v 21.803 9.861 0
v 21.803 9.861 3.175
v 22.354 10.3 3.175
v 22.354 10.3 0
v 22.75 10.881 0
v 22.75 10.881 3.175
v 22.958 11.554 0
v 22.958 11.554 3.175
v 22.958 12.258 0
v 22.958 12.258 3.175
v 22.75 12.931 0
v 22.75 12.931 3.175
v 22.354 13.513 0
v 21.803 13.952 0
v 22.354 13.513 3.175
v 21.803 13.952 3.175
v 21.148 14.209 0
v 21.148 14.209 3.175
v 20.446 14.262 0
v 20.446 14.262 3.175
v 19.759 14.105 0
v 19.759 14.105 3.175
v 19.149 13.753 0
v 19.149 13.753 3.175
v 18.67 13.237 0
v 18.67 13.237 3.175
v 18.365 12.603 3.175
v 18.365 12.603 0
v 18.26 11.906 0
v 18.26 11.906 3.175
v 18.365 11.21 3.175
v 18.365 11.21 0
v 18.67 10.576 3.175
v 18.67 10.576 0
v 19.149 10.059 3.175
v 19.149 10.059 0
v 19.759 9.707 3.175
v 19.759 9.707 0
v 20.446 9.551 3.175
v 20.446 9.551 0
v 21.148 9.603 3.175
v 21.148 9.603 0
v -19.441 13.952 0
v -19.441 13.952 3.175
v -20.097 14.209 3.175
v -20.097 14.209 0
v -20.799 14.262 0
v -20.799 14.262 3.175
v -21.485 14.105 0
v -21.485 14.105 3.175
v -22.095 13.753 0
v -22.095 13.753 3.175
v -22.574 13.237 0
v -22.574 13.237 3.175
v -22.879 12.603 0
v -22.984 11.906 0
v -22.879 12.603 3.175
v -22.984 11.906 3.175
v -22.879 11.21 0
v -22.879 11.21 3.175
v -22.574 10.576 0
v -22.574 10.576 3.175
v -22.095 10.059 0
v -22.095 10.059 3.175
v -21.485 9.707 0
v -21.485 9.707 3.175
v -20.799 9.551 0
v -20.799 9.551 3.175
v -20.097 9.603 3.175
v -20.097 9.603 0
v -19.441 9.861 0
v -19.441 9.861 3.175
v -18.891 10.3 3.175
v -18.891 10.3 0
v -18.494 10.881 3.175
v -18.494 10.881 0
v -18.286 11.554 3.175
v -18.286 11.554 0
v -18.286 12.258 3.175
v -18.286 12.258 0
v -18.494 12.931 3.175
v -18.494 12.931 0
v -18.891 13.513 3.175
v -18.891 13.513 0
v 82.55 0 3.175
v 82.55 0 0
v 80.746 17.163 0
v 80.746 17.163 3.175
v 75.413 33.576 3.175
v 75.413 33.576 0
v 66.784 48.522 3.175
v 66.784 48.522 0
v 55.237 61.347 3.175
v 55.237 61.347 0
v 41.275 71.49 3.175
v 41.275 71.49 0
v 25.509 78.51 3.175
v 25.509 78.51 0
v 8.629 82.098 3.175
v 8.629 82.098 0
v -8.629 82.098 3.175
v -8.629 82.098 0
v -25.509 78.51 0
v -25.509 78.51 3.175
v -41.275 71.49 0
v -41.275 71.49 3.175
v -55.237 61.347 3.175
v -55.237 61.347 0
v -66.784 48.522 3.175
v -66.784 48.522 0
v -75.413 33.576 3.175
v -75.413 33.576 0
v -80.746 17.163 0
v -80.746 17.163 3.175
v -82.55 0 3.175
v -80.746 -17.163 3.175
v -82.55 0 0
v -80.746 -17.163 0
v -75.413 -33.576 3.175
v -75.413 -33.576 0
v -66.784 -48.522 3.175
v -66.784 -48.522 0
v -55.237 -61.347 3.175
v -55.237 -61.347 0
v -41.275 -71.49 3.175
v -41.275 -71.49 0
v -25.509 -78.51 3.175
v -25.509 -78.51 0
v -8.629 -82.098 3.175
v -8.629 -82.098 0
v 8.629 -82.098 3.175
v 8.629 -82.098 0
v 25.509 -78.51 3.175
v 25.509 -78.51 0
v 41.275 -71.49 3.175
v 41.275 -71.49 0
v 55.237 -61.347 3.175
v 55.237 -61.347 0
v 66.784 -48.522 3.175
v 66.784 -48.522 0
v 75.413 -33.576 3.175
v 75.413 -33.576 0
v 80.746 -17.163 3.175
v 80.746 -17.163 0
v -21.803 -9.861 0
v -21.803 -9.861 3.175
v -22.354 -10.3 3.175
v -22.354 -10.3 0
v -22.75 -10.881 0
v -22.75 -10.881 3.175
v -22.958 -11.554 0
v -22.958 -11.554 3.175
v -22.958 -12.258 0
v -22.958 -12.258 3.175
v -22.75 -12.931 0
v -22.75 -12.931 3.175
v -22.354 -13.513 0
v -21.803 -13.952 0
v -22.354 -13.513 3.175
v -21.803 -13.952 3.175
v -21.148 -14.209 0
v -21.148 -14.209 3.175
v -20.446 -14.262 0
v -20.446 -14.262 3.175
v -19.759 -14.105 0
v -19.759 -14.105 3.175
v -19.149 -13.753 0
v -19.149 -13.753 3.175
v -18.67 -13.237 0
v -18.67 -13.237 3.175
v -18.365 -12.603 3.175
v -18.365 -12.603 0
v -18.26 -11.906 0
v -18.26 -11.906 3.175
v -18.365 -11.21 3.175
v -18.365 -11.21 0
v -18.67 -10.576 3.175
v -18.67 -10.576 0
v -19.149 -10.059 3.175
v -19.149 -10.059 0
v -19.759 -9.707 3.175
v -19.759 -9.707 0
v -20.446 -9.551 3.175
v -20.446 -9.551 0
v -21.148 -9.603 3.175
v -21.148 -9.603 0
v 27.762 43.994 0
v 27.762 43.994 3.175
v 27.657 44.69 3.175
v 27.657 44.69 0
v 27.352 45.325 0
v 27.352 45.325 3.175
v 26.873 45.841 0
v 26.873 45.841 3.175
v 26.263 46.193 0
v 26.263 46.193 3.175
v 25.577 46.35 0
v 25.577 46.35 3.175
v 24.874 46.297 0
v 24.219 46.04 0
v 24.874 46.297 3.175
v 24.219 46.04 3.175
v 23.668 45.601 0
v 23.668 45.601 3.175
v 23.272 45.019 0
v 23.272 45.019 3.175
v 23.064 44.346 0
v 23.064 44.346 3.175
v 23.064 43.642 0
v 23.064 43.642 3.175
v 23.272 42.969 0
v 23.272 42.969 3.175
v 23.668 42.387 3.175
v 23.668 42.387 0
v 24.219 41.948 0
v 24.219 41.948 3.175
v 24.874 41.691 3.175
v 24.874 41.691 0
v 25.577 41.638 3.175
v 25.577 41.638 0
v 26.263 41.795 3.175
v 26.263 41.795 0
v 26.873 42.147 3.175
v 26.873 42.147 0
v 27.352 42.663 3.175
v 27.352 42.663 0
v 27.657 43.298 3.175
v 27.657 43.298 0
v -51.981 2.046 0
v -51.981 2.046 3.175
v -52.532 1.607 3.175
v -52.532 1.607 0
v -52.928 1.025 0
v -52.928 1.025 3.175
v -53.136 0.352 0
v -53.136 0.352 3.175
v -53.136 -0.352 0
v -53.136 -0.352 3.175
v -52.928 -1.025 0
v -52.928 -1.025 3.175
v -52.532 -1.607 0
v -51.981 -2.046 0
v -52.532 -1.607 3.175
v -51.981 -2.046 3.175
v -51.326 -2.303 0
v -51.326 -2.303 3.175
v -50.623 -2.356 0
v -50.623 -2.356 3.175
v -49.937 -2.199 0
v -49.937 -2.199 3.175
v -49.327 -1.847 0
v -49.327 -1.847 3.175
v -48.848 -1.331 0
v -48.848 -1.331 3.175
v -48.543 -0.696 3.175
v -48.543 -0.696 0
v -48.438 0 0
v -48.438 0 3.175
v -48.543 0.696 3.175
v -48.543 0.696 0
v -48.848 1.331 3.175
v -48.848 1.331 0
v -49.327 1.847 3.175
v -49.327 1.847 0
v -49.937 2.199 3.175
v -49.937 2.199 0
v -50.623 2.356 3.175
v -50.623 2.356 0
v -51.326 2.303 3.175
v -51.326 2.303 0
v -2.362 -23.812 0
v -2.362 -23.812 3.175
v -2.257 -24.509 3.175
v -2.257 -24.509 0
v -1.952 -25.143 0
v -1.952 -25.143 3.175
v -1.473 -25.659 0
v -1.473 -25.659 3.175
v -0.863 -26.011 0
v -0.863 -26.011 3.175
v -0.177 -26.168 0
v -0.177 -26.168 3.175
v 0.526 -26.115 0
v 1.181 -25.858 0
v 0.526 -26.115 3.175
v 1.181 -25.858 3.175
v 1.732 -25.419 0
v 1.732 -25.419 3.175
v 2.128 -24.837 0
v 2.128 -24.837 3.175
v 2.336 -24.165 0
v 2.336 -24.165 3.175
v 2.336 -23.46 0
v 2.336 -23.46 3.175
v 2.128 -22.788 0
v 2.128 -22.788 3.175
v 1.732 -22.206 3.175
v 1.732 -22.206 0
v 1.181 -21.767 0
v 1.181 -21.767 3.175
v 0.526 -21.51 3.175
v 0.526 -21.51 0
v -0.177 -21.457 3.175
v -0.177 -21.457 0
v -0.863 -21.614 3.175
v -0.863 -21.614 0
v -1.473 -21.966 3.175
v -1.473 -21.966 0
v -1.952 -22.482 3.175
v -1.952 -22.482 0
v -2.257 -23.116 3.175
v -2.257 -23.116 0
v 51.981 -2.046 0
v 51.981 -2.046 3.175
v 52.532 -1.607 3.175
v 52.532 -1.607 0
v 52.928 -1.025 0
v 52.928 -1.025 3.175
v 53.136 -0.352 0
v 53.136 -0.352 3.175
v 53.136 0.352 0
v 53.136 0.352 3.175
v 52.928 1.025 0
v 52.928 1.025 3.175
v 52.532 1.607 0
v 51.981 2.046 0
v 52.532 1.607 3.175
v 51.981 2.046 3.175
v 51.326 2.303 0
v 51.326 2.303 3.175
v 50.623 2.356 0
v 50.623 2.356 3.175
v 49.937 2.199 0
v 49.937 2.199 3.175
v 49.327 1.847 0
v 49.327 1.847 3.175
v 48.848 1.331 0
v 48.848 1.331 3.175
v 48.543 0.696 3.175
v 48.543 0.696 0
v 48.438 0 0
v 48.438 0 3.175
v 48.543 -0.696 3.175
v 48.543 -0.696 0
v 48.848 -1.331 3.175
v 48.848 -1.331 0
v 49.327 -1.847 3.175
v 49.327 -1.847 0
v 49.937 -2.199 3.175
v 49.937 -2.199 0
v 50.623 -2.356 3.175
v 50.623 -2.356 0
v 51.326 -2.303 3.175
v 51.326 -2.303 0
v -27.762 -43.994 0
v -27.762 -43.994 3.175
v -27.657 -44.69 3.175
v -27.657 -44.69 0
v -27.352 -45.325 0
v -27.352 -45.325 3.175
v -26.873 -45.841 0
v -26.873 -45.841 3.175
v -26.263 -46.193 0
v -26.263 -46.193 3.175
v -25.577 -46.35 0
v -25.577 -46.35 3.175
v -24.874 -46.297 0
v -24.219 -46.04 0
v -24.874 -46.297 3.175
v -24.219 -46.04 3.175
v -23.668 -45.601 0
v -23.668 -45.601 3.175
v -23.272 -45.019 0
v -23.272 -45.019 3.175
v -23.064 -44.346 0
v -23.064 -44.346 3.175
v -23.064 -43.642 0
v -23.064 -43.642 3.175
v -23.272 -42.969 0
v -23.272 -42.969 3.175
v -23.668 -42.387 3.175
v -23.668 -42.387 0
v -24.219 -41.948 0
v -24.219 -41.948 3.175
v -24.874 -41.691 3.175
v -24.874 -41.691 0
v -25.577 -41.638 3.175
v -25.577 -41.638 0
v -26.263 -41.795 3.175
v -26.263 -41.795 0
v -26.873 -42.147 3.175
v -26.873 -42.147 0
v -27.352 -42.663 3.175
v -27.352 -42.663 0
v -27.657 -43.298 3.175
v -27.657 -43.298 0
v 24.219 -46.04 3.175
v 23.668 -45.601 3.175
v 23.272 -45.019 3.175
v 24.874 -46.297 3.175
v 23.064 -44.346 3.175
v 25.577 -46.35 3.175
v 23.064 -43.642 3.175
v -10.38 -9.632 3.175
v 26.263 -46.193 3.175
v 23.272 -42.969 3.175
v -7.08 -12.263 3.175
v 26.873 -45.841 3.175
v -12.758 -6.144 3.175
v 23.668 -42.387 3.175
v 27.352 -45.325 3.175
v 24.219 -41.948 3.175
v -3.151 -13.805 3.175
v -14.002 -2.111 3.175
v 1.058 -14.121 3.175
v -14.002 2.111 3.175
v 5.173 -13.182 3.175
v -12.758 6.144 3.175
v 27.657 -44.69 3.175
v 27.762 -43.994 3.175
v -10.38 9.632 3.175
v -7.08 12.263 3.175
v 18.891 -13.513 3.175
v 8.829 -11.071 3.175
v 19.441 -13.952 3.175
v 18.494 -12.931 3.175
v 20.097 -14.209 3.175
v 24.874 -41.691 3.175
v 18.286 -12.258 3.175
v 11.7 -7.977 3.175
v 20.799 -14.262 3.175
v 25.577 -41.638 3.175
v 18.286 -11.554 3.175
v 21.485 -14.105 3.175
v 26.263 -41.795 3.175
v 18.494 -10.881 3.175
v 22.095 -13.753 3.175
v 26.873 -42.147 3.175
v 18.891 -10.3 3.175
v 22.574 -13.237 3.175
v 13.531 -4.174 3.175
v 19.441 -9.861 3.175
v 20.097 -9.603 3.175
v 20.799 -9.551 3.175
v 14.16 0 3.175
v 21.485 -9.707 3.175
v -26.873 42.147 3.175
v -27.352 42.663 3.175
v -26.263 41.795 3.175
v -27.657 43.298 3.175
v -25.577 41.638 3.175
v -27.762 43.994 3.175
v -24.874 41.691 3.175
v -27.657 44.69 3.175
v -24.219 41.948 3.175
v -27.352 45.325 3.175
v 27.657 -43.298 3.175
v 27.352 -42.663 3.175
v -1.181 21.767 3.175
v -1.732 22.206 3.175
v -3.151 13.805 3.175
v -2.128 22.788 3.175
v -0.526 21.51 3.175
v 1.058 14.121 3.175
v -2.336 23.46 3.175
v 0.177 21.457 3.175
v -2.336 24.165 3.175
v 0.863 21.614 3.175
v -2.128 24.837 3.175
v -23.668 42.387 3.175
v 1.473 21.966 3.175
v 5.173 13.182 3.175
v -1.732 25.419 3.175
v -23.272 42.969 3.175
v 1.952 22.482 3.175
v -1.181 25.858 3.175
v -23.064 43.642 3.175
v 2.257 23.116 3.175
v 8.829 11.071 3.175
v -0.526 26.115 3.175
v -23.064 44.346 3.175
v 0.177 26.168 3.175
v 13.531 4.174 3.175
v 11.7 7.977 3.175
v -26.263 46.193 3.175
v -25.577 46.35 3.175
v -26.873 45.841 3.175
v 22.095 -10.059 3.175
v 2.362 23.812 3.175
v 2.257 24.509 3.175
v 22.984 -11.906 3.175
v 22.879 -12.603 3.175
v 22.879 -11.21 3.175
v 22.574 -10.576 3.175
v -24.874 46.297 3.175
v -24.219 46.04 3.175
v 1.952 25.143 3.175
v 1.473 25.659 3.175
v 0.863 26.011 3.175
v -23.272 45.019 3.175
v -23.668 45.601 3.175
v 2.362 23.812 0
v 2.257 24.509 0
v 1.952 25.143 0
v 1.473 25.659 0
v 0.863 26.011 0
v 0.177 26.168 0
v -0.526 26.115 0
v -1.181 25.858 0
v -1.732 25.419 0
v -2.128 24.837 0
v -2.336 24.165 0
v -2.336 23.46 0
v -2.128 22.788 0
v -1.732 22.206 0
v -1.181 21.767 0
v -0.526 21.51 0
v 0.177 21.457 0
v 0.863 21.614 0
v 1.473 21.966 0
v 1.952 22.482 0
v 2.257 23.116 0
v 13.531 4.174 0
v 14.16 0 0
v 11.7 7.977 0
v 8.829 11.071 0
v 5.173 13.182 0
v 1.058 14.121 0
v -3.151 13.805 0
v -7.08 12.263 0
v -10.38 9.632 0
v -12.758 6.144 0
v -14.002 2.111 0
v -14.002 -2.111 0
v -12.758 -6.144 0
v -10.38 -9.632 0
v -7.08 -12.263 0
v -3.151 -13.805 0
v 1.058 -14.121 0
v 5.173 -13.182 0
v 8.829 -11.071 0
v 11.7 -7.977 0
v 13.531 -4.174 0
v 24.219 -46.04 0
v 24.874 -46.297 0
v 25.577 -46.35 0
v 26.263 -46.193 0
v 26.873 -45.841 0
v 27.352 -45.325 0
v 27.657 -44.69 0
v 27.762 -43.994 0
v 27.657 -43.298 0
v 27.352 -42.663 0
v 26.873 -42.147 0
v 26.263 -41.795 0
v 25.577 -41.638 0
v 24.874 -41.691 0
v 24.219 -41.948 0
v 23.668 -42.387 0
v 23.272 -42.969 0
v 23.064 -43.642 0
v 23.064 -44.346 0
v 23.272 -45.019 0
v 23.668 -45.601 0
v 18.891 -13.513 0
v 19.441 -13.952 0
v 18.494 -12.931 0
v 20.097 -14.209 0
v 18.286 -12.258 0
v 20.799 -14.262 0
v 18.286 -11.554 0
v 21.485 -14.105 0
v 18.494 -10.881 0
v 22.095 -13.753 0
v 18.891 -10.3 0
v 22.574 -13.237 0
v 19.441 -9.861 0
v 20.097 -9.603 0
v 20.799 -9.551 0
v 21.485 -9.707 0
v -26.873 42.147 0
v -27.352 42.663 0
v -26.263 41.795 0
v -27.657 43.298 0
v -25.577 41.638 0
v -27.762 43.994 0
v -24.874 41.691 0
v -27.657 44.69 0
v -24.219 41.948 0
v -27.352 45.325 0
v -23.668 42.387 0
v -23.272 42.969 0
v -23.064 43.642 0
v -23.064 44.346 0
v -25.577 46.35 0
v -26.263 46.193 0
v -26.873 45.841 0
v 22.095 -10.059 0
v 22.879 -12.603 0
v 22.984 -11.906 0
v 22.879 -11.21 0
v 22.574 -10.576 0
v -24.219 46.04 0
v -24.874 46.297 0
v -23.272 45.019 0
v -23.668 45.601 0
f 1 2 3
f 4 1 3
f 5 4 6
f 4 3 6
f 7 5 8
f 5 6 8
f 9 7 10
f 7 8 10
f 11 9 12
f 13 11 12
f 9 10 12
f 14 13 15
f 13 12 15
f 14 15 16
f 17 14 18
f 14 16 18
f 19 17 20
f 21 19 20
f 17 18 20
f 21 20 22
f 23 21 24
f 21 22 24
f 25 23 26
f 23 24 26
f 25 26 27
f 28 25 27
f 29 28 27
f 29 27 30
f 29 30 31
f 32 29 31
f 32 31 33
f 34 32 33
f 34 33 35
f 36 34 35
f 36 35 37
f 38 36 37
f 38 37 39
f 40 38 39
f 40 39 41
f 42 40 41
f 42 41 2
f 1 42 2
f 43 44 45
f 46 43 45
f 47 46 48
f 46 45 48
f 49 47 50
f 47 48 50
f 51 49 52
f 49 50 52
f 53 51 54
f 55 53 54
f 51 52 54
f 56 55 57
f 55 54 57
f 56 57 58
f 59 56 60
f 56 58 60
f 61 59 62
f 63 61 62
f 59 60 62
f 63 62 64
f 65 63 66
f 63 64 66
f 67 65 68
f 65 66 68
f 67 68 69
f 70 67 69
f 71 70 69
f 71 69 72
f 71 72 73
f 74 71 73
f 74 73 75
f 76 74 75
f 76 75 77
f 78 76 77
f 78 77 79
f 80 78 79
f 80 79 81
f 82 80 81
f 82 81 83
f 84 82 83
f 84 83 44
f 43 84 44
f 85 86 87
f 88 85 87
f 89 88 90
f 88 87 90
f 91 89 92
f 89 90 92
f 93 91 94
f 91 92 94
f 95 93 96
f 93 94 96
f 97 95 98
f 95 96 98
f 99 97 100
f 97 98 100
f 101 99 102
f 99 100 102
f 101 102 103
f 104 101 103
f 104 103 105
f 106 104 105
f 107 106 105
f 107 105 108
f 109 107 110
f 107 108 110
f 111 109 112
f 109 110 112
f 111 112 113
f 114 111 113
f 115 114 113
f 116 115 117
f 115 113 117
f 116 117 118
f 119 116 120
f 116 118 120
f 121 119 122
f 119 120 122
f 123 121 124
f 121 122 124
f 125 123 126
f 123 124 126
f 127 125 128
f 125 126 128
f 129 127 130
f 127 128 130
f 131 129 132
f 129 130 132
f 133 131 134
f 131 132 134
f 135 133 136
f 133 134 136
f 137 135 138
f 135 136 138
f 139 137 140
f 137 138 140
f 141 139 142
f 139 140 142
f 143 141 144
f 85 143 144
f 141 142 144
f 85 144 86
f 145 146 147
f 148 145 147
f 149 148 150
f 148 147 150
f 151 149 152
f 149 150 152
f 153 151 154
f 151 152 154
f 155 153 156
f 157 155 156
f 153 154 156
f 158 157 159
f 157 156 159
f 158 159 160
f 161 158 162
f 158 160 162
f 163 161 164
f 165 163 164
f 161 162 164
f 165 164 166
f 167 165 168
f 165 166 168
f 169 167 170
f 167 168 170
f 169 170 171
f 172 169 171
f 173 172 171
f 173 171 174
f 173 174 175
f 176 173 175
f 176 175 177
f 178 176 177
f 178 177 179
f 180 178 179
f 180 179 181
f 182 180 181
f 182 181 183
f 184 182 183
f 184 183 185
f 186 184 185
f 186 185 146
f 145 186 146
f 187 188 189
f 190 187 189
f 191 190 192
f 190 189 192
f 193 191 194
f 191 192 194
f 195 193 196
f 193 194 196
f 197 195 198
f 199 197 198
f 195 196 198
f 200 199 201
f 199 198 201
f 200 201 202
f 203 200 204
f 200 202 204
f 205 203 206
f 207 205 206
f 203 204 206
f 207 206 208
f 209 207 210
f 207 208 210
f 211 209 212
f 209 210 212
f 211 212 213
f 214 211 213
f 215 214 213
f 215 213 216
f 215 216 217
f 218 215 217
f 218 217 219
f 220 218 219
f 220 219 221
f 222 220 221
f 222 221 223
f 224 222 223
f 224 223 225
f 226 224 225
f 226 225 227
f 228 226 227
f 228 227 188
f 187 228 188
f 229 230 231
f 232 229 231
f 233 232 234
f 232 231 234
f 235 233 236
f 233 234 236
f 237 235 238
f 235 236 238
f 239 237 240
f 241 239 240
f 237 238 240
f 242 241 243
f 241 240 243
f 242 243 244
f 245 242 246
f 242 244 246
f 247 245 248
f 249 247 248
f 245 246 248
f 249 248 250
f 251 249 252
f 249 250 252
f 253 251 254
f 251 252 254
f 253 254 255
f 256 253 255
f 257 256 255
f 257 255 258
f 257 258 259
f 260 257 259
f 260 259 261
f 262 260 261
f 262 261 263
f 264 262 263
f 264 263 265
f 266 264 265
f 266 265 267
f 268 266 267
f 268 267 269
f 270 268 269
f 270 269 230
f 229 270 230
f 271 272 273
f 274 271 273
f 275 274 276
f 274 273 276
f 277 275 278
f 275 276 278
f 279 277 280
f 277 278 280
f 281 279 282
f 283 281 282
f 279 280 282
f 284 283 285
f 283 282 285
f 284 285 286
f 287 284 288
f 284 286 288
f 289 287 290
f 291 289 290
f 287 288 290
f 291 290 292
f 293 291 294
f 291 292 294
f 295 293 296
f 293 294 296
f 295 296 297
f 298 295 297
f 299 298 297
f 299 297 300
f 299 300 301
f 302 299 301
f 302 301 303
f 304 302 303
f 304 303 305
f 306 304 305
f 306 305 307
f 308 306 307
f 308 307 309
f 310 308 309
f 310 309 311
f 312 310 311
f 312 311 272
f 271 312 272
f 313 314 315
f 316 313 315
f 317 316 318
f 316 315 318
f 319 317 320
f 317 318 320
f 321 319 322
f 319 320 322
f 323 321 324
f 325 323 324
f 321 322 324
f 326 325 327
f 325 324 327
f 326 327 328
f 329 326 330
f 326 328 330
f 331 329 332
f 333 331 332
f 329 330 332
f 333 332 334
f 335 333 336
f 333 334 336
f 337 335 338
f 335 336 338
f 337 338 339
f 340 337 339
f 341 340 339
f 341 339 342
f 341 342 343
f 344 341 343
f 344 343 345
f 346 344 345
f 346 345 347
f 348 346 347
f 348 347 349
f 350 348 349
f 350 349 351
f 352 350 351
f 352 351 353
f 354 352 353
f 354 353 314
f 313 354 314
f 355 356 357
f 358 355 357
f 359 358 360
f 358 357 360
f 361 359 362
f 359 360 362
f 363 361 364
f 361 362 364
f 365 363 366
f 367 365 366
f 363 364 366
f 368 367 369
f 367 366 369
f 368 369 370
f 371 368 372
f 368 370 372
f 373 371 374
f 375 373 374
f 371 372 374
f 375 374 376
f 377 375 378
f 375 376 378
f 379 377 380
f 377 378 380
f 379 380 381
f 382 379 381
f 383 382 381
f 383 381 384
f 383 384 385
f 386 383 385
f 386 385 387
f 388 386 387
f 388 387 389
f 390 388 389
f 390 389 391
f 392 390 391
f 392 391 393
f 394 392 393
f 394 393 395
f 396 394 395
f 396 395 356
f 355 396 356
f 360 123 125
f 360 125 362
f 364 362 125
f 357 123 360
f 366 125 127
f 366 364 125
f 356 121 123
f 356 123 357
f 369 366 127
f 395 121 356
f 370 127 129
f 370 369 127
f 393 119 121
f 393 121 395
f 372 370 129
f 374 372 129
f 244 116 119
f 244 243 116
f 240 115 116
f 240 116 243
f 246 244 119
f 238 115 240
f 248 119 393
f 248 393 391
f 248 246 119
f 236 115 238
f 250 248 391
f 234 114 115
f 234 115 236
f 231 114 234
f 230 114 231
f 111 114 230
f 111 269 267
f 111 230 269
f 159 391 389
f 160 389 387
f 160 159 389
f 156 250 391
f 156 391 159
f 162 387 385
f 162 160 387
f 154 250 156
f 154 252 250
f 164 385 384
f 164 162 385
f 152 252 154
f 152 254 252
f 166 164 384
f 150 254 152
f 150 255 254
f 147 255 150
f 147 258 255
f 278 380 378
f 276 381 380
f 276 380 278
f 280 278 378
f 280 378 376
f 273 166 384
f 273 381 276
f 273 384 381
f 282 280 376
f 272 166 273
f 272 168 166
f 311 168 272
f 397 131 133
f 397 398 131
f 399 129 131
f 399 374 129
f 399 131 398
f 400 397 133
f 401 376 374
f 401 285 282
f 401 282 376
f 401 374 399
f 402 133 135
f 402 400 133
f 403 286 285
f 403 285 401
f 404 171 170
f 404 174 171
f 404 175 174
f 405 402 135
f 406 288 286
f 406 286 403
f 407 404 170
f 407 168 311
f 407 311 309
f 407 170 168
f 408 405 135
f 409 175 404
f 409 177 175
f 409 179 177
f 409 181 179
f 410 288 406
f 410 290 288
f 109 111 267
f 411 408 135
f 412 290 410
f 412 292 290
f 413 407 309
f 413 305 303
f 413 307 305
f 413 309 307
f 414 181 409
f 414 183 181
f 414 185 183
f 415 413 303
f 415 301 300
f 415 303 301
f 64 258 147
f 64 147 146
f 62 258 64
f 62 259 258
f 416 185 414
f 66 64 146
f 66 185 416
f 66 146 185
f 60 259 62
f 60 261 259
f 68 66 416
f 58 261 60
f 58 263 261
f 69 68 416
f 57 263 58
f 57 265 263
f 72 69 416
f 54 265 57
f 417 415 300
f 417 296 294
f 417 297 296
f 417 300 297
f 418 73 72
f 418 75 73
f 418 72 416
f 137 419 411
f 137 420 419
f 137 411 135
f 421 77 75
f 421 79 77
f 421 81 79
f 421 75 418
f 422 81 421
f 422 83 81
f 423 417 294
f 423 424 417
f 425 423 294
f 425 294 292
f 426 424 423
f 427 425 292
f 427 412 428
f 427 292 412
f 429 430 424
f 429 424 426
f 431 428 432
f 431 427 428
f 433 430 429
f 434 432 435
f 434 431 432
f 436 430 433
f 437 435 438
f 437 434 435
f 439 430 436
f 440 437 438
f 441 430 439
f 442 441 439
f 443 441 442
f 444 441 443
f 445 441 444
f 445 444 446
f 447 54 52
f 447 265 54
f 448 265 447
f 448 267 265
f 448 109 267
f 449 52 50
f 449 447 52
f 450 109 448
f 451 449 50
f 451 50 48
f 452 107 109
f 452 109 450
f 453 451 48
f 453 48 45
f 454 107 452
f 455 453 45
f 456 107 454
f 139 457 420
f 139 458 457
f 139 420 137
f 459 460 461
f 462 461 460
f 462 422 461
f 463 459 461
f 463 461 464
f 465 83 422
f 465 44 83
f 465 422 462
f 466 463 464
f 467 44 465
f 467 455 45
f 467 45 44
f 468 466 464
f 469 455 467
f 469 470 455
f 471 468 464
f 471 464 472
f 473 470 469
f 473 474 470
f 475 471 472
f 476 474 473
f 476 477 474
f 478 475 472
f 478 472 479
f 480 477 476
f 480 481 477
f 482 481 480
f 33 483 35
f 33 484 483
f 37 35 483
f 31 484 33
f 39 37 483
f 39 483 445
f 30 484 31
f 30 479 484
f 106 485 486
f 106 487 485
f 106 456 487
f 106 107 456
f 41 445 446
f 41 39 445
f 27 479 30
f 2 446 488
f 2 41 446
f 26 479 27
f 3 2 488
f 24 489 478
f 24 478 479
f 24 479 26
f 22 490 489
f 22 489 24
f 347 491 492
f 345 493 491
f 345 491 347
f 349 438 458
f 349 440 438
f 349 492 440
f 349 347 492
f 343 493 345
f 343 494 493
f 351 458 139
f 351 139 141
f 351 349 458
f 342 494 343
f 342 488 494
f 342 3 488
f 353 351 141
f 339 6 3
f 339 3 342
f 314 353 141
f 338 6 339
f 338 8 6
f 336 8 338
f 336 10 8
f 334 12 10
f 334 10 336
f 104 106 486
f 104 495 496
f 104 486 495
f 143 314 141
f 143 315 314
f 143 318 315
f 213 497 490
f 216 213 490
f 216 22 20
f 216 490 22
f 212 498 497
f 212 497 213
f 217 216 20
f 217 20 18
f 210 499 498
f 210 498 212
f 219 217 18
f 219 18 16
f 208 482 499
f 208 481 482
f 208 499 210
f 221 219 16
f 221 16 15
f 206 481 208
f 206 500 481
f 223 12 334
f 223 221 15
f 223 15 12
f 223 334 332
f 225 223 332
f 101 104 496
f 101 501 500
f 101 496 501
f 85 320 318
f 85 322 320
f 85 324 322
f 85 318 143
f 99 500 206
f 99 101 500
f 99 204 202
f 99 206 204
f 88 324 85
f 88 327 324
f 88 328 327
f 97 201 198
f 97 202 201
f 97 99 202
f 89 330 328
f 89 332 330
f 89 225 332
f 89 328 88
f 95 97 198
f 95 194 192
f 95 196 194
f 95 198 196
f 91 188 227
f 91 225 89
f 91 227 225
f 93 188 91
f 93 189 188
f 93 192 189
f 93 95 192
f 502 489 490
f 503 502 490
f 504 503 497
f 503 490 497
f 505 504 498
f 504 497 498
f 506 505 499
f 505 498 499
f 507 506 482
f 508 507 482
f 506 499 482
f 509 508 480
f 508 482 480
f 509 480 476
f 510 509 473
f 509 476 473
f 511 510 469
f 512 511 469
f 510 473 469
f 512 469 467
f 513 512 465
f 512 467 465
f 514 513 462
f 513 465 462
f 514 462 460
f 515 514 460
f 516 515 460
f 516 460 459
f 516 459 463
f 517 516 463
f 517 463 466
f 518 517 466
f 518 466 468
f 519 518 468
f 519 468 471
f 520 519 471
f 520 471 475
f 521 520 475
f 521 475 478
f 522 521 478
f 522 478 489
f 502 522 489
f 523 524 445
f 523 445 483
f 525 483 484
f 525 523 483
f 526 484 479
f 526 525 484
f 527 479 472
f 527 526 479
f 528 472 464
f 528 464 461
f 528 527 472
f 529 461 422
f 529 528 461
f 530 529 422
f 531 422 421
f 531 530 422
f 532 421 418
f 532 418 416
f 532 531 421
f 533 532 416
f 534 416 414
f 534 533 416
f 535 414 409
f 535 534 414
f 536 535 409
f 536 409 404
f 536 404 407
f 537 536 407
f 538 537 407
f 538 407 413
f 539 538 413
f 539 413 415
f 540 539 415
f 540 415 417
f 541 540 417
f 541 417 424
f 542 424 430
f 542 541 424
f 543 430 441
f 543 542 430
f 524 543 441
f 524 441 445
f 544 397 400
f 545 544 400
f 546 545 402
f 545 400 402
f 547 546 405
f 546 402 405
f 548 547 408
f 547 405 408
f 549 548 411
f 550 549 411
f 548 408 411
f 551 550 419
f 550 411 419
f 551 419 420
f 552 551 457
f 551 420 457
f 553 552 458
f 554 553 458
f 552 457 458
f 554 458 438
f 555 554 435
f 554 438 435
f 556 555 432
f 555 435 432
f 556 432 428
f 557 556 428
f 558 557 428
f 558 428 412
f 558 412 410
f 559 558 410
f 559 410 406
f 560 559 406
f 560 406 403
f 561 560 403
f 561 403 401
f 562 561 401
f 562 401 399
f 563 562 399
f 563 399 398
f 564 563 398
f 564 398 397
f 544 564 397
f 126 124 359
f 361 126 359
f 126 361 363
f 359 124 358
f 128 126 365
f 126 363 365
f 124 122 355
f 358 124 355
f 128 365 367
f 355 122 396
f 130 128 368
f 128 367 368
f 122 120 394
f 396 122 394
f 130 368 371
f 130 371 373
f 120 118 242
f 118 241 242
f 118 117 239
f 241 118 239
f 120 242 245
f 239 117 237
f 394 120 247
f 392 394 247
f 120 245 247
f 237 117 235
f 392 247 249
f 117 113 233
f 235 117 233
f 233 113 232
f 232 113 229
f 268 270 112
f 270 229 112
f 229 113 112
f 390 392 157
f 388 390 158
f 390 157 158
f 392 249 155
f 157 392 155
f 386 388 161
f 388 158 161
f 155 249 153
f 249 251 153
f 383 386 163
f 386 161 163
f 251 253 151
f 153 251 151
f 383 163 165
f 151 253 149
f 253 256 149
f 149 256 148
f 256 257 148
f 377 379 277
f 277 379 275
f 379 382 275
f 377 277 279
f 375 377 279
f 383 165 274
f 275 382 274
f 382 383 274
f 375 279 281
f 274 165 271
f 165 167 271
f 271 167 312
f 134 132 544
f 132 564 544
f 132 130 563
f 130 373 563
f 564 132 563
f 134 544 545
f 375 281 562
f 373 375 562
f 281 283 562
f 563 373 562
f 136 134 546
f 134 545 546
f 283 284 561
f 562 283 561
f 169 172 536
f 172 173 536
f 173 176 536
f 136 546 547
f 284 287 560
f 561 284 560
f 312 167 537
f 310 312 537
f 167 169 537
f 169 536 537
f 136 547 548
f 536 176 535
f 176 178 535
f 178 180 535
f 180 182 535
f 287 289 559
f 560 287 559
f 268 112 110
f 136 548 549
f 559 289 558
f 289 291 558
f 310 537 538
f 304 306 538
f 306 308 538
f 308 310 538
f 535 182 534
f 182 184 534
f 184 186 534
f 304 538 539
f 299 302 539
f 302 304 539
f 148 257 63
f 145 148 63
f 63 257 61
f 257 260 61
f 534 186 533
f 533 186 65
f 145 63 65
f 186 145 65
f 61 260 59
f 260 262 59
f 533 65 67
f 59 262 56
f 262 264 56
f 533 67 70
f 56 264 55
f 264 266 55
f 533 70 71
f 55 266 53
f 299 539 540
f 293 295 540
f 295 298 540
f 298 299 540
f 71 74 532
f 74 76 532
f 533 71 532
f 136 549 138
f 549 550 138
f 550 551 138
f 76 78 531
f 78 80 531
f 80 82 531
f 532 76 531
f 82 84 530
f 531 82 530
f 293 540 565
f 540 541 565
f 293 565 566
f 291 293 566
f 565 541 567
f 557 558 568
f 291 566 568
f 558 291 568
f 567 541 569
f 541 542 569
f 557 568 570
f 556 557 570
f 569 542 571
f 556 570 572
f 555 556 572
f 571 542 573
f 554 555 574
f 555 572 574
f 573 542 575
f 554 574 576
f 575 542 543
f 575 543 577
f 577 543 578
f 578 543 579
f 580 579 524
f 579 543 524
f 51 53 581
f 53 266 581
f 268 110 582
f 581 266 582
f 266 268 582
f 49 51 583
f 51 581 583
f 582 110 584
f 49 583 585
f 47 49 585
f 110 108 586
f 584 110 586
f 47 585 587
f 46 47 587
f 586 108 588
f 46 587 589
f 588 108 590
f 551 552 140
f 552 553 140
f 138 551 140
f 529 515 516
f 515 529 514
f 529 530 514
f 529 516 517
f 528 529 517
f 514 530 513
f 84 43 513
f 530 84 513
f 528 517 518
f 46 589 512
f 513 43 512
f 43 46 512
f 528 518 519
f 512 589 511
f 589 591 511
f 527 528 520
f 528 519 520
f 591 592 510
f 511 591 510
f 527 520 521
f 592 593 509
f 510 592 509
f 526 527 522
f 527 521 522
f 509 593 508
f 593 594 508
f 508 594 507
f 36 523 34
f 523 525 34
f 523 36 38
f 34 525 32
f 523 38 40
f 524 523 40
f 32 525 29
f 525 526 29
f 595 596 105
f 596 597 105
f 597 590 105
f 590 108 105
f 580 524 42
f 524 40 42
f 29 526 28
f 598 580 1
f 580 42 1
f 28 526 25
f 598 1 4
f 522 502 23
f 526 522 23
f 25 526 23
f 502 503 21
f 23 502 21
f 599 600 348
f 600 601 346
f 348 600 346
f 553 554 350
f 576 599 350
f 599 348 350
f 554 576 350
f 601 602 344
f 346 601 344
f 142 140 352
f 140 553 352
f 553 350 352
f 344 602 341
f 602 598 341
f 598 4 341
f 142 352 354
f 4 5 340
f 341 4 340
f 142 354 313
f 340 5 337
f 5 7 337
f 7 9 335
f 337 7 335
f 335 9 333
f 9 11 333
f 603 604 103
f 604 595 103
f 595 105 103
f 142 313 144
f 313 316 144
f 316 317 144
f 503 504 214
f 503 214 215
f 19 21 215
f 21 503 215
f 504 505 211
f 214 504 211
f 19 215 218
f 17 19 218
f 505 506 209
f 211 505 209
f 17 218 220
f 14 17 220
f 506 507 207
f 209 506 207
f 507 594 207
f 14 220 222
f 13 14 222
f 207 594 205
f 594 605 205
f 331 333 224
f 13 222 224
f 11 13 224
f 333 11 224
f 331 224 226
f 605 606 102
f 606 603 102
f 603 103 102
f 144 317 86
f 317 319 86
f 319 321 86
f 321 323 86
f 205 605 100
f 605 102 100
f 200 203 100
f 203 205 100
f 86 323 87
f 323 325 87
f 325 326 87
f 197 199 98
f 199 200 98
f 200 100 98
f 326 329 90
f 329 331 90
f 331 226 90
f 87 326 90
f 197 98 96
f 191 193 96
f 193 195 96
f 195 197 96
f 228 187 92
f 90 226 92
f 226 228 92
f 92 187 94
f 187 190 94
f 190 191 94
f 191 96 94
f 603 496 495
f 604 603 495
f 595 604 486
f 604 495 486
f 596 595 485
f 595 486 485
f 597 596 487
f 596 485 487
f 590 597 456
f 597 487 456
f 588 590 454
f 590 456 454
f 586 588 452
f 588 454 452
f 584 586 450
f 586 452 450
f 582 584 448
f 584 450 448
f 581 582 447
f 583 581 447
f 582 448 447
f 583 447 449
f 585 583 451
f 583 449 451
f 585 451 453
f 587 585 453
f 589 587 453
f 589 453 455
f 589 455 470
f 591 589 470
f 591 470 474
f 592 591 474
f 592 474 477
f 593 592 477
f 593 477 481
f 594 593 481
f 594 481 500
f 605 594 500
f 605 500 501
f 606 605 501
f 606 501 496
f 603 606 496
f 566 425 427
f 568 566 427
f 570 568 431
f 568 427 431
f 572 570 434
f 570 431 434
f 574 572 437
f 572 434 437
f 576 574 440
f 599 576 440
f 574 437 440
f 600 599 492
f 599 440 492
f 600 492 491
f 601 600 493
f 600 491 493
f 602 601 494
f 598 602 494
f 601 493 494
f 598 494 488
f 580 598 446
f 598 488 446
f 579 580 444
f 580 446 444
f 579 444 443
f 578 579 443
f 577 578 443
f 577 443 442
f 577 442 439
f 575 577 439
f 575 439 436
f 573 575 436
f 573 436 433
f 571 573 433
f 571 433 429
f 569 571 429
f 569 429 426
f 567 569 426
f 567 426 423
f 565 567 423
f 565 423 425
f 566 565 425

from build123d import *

# Parameters (mm, degrees)
F0_R            = 82.55
F0_R_2          = 14.1605
F1_DEPTH        = 3.175
F2_R            = 2.3622
F3_DEPTH        = 3.176
F3_COPIES_COUNT = 6


# Not quite as in the source:
# - a pattern or mirror of a feature is missing from the dataset's text; its kind, count and spacing are read off the source's solid


with BuildPart() as f1:
    # F0 (on Top) → F1 (new body)
    with BuildSketch(Plane.XY):
        Circle(F0_R)
        Circle(F0_R_2, mode=Mode.SUBTRACT)
    extrude(amount=F1_DEPTH)

    # F2 (on face) → F3 (cut, through all)
    with BuildSketch(Plane.XY.offset(3.175)):
        with Locations((0, 23.8125)):
            Circle(F2_R)
        with Locations((25.4, 43.9940905122)):
            Circle(F2_R)
    f3 = extrude(amount=-F3_DEPTH, mode=Mode.SUBTRACT)

    # F3_copies: F3 ×6 about axis
    f3_copies_axis = Axis((0, 0, 0), (0, 0, 1))
    for i in range(1, F3_COPIES_COUNT):
        add(f3.rotate(f3_copies_axis, i * 360 / F3_COPIES_COUNT), mode=Mode.SUBTRACT)


solid = f1.part
